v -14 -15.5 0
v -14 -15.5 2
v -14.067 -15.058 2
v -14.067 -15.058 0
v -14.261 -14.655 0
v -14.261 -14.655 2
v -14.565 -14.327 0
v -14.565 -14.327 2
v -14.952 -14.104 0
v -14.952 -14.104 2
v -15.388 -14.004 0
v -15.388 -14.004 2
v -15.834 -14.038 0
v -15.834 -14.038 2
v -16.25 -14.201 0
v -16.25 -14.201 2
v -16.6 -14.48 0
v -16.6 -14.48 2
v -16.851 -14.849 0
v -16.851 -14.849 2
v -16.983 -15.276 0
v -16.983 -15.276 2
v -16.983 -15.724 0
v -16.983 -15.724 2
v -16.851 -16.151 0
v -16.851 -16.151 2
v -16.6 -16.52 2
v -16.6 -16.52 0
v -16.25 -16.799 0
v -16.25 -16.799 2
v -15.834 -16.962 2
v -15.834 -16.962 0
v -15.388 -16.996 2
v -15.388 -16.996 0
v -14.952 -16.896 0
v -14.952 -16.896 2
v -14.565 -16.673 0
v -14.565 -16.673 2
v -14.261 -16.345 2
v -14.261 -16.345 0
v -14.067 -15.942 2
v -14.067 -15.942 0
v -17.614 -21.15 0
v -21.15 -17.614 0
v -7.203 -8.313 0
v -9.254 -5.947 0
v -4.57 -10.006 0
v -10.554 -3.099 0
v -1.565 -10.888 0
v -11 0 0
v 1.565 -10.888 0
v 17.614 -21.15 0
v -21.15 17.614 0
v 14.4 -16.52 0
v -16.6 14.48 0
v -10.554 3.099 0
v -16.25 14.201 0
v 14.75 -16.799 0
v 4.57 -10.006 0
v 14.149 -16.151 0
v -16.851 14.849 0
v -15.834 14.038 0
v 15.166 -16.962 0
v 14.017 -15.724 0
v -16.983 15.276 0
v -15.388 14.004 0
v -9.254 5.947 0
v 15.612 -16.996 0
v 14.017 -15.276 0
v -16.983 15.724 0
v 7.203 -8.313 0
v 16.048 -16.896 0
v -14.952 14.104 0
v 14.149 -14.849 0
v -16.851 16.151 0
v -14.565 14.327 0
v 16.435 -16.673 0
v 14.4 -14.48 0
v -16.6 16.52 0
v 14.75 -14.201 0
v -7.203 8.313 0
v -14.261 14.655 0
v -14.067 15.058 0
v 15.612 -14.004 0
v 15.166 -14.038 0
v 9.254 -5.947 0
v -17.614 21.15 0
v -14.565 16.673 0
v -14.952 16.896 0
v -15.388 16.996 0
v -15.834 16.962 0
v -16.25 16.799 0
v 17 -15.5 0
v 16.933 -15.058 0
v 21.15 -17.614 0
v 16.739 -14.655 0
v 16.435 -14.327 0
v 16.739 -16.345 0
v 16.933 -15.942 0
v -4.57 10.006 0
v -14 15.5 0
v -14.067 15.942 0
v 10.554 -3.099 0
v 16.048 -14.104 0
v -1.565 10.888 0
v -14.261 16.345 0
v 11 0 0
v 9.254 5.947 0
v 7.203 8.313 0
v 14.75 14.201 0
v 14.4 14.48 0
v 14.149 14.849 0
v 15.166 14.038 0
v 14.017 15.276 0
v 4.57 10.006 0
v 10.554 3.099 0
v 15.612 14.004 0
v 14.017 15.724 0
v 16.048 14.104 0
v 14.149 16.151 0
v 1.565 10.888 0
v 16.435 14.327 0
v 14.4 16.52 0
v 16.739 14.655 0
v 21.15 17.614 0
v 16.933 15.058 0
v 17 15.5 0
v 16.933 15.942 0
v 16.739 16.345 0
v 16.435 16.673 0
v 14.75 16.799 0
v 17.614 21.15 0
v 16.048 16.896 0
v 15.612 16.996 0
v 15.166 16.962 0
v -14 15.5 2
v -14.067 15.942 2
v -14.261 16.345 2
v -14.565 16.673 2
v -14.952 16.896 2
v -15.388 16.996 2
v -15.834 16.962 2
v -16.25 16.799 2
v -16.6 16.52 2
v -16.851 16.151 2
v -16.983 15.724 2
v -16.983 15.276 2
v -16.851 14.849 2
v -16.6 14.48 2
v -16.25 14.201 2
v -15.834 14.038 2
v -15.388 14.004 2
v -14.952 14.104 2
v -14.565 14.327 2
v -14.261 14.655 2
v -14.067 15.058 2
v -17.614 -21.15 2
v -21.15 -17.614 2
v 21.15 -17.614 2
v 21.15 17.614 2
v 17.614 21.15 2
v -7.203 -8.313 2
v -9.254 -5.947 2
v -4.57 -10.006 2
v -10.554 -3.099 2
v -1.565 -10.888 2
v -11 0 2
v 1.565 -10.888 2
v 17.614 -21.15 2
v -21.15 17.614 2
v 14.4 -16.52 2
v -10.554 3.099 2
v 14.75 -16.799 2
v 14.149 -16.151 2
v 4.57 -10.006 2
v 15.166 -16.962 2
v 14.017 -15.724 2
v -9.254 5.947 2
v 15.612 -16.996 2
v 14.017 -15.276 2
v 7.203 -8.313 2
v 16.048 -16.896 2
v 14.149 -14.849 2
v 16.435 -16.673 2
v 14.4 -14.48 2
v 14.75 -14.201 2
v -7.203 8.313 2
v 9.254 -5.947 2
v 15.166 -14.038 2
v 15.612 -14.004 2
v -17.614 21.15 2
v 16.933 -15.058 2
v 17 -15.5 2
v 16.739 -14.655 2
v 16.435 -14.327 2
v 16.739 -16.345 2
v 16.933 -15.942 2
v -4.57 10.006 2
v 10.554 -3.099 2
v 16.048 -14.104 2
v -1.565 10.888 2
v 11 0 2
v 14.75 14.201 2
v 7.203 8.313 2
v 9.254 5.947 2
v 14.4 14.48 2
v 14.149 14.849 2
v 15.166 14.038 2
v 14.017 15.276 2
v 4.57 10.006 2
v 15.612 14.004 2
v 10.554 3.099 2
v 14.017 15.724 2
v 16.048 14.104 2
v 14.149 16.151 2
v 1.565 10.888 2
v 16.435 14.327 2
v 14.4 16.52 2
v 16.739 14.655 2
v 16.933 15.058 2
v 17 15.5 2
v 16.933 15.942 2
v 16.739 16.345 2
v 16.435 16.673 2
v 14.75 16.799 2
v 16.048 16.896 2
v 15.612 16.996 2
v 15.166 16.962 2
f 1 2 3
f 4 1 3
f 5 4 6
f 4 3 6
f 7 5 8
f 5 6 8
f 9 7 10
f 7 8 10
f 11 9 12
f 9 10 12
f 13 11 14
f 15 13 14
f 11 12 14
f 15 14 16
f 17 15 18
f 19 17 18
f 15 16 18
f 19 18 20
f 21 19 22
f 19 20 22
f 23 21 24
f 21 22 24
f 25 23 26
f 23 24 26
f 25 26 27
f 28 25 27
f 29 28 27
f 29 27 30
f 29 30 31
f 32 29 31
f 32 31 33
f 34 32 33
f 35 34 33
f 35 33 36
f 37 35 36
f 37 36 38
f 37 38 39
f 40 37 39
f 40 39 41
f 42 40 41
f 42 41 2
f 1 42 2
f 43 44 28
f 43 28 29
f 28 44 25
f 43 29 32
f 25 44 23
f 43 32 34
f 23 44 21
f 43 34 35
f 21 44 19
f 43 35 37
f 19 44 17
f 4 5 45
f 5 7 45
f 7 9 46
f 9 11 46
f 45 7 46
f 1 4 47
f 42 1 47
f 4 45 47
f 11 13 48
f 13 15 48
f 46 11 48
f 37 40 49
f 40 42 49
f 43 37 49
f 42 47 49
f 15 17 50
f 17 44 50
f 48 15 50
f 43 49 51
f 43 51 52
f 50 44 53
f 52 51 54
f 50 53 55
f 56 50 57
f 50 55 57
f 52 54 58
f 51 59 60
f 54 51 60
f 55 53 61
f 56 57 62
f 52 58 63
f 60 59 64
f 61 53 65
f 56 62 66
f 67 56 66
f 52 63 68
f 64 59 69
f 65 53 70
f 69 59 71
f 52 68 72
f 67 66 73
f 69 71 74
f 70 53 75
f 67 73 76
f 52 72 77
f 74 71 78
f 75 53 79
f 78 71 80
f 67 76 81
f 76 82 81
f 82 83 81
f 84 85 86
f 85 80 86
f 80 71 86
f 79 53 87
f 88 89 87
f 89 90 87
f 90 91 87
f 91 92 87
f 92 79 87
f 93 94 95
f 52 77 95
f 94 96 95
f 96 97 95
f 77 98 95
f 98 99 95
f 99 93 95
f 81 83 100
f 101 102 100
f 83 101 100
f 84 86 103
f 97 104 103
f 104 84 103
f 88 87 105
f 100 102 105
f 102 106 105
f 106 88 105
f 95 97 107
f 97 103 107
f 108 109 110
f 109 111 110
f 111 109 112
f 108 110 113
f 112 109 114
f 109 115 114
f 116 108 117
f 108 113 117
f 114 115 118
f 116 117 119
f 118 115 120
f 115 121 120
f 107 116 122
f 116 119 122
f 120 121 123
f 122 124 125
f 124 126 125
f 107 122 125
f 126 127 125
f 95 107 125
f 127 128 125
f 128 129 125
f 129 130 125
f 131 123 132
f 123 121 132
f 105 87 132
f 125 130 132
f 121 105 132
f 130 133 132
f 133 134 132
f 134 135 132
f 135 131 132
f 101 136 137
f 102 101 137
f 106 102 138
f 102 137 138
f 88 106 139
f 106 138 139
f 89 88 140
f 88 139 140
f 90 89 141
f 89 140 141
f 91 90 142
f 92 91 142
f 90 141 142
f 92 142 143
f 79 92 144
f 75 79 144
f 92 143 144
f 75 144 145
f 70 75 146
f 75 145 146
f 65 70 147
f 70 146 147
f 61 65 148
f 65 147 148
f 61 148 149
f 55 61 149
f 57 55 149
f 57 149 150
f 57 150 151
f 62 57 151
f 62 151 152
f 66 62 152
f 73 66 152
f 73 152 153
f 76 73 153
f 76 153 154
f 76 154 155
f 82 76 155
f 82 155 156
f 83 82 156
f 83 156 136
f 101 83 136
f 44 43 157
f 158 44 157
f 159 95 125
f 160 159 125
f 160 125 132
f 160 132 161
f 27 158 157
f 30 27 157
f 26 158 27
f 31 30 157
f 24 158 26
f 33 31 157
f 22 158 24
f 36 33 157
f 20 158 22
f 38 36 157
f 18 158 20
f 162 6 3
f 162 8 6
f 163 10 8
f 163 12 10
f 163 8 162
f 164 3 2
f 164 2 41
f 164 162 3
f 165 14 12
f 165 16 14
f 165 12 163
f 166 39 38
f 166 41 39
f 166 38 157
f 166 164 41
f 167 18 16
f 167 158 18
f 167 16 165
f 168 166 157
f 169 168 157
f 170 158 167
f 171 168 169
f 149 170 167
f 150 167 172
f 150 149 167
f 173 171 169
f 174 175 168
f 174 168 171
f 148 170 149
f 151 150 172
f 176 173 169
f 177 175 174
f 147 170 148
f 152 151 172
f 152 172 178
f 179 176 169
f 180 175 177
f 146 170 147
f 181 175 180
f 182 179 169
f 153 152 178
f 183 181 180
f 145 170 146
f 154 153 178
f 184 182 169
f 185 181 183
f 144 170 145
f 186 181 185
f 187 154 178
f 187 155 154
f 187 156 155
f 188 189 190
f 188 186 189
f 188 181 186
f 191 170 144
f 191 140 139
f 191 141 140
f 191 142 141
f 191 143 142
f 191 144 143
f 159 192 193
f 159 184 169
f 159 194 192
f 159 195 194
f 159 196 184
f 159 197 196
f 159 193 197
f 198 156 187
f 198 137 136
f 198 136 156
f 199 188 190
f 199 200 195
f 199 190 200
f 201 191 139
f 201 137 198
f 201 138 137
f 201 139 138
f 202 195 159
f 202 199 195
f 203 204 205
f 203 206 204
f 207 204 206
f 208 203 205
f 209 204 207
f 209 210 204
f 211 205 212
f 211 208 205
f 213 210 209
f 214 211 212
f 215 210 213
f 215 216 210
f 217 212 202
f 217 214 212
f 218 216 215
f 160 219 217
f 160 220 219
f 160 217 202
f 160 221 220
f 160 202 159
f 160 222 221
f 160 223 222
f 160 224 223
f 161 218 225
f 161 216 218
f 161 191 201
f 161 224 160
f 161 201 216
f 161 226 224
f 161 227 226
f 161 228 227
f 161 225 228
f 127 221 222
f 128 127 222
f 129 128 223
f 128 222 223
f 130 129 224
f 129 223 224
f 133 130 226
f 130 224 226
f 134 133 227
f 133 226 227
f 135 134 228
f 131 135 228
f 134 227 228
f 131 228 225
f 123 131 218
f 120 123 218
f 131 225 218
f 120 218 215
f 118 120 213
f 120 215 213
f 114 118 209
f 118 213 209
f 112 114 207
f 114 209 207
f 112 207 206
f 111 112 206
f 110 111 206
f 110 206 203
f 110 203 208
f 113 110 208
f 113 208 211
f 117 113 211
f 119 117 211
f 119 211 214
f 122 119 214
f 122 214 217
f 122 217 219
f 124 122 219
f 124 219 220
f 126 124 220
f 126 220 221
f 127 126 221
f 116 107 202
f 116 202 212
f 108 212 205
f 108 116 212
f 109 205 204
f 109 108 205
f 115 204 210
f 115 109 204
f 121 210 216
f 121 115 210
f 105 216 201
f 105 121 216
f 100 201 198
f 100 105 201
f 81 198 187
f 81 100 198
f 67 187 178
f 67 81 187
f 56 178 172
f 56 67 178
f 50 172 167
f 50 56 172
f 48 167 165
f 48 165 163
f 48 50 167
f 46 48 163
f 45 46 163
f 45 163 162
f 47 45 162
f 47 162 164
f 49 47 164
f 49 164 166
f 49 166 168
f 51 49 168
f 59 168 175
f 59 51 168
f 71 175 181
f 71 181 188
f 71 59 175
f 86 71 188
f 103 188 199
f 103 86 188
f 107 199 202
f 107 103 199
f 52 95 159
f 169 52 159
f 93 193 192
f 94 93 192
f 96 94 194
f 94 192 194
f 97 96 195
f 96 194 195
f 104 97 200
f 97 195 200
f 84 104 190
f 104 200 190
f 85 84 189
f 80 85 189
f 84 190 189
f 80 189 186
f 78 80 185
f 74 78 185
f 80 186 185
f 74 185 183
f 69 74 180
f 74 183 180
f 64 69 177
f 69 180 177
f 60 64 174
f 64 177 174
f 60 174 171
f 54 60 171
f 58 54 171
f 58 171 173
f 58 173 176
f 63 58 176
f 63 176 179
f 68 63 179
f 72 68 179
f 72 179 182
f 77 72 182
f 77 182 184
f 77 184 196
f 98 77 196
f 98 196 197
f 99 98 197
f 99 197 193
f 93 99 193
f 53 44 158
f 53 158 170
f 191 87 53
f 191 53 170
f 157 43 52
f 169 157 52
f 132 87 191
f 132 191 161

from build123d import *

# Parameters (mm, degrees)
SKETCH_W     = 42.3
SKETCH_H     = 42.3
SKETCH_R     = 11
PAD_DEPTH    = 2
CHAMFER_SIZE = 3.535534
SKETCH001_R  = 1.5
POCKET_DEPTH = 2.001


with BuildPart() as part:
    # Sketch → Pad (new body)
    with BuildSketch(Plane.XY):
        Rectangle(SKETCH_W, SKETCH_H)
        Circle(SKETCH_R, mode=Mode.SUBTRACT)
    extrude(amount=PAD_DEPTH)

    # Chamfer
    chamfer_edges = [part.edges().sort_by_distance(p)[0] for p in [
        (21.15, -21.15, 1),
        (21.15, 21.15, 1),
        (-21.15, -21.15, 1),
        (-21.15, 21.15, 1),
    ]]
    chamfer(chamfer_edges, length=CHAMFER_SIZE)

    # Sketch001 (on Face5 of Chamfer) → Pocket (cut, through all)
    with BuildSketch(Plane.XY.offset(2)):
        with Locations((15.5, 15.5)):
            Circle(SKETCH001_R)
        with Locations((-15.5, -15.5)):
            Circle(SKETCH001_R)
        with Locations((15.5, -15.5)):
            Circle(SKETCH001_R)
        with Locations((-15.5, 15.5)):
            Circle(SKETCH001_R)
    extrude(amount=-POCKET_DEPTH, mode=Mode.SUBTRACT)


solid = part.part
